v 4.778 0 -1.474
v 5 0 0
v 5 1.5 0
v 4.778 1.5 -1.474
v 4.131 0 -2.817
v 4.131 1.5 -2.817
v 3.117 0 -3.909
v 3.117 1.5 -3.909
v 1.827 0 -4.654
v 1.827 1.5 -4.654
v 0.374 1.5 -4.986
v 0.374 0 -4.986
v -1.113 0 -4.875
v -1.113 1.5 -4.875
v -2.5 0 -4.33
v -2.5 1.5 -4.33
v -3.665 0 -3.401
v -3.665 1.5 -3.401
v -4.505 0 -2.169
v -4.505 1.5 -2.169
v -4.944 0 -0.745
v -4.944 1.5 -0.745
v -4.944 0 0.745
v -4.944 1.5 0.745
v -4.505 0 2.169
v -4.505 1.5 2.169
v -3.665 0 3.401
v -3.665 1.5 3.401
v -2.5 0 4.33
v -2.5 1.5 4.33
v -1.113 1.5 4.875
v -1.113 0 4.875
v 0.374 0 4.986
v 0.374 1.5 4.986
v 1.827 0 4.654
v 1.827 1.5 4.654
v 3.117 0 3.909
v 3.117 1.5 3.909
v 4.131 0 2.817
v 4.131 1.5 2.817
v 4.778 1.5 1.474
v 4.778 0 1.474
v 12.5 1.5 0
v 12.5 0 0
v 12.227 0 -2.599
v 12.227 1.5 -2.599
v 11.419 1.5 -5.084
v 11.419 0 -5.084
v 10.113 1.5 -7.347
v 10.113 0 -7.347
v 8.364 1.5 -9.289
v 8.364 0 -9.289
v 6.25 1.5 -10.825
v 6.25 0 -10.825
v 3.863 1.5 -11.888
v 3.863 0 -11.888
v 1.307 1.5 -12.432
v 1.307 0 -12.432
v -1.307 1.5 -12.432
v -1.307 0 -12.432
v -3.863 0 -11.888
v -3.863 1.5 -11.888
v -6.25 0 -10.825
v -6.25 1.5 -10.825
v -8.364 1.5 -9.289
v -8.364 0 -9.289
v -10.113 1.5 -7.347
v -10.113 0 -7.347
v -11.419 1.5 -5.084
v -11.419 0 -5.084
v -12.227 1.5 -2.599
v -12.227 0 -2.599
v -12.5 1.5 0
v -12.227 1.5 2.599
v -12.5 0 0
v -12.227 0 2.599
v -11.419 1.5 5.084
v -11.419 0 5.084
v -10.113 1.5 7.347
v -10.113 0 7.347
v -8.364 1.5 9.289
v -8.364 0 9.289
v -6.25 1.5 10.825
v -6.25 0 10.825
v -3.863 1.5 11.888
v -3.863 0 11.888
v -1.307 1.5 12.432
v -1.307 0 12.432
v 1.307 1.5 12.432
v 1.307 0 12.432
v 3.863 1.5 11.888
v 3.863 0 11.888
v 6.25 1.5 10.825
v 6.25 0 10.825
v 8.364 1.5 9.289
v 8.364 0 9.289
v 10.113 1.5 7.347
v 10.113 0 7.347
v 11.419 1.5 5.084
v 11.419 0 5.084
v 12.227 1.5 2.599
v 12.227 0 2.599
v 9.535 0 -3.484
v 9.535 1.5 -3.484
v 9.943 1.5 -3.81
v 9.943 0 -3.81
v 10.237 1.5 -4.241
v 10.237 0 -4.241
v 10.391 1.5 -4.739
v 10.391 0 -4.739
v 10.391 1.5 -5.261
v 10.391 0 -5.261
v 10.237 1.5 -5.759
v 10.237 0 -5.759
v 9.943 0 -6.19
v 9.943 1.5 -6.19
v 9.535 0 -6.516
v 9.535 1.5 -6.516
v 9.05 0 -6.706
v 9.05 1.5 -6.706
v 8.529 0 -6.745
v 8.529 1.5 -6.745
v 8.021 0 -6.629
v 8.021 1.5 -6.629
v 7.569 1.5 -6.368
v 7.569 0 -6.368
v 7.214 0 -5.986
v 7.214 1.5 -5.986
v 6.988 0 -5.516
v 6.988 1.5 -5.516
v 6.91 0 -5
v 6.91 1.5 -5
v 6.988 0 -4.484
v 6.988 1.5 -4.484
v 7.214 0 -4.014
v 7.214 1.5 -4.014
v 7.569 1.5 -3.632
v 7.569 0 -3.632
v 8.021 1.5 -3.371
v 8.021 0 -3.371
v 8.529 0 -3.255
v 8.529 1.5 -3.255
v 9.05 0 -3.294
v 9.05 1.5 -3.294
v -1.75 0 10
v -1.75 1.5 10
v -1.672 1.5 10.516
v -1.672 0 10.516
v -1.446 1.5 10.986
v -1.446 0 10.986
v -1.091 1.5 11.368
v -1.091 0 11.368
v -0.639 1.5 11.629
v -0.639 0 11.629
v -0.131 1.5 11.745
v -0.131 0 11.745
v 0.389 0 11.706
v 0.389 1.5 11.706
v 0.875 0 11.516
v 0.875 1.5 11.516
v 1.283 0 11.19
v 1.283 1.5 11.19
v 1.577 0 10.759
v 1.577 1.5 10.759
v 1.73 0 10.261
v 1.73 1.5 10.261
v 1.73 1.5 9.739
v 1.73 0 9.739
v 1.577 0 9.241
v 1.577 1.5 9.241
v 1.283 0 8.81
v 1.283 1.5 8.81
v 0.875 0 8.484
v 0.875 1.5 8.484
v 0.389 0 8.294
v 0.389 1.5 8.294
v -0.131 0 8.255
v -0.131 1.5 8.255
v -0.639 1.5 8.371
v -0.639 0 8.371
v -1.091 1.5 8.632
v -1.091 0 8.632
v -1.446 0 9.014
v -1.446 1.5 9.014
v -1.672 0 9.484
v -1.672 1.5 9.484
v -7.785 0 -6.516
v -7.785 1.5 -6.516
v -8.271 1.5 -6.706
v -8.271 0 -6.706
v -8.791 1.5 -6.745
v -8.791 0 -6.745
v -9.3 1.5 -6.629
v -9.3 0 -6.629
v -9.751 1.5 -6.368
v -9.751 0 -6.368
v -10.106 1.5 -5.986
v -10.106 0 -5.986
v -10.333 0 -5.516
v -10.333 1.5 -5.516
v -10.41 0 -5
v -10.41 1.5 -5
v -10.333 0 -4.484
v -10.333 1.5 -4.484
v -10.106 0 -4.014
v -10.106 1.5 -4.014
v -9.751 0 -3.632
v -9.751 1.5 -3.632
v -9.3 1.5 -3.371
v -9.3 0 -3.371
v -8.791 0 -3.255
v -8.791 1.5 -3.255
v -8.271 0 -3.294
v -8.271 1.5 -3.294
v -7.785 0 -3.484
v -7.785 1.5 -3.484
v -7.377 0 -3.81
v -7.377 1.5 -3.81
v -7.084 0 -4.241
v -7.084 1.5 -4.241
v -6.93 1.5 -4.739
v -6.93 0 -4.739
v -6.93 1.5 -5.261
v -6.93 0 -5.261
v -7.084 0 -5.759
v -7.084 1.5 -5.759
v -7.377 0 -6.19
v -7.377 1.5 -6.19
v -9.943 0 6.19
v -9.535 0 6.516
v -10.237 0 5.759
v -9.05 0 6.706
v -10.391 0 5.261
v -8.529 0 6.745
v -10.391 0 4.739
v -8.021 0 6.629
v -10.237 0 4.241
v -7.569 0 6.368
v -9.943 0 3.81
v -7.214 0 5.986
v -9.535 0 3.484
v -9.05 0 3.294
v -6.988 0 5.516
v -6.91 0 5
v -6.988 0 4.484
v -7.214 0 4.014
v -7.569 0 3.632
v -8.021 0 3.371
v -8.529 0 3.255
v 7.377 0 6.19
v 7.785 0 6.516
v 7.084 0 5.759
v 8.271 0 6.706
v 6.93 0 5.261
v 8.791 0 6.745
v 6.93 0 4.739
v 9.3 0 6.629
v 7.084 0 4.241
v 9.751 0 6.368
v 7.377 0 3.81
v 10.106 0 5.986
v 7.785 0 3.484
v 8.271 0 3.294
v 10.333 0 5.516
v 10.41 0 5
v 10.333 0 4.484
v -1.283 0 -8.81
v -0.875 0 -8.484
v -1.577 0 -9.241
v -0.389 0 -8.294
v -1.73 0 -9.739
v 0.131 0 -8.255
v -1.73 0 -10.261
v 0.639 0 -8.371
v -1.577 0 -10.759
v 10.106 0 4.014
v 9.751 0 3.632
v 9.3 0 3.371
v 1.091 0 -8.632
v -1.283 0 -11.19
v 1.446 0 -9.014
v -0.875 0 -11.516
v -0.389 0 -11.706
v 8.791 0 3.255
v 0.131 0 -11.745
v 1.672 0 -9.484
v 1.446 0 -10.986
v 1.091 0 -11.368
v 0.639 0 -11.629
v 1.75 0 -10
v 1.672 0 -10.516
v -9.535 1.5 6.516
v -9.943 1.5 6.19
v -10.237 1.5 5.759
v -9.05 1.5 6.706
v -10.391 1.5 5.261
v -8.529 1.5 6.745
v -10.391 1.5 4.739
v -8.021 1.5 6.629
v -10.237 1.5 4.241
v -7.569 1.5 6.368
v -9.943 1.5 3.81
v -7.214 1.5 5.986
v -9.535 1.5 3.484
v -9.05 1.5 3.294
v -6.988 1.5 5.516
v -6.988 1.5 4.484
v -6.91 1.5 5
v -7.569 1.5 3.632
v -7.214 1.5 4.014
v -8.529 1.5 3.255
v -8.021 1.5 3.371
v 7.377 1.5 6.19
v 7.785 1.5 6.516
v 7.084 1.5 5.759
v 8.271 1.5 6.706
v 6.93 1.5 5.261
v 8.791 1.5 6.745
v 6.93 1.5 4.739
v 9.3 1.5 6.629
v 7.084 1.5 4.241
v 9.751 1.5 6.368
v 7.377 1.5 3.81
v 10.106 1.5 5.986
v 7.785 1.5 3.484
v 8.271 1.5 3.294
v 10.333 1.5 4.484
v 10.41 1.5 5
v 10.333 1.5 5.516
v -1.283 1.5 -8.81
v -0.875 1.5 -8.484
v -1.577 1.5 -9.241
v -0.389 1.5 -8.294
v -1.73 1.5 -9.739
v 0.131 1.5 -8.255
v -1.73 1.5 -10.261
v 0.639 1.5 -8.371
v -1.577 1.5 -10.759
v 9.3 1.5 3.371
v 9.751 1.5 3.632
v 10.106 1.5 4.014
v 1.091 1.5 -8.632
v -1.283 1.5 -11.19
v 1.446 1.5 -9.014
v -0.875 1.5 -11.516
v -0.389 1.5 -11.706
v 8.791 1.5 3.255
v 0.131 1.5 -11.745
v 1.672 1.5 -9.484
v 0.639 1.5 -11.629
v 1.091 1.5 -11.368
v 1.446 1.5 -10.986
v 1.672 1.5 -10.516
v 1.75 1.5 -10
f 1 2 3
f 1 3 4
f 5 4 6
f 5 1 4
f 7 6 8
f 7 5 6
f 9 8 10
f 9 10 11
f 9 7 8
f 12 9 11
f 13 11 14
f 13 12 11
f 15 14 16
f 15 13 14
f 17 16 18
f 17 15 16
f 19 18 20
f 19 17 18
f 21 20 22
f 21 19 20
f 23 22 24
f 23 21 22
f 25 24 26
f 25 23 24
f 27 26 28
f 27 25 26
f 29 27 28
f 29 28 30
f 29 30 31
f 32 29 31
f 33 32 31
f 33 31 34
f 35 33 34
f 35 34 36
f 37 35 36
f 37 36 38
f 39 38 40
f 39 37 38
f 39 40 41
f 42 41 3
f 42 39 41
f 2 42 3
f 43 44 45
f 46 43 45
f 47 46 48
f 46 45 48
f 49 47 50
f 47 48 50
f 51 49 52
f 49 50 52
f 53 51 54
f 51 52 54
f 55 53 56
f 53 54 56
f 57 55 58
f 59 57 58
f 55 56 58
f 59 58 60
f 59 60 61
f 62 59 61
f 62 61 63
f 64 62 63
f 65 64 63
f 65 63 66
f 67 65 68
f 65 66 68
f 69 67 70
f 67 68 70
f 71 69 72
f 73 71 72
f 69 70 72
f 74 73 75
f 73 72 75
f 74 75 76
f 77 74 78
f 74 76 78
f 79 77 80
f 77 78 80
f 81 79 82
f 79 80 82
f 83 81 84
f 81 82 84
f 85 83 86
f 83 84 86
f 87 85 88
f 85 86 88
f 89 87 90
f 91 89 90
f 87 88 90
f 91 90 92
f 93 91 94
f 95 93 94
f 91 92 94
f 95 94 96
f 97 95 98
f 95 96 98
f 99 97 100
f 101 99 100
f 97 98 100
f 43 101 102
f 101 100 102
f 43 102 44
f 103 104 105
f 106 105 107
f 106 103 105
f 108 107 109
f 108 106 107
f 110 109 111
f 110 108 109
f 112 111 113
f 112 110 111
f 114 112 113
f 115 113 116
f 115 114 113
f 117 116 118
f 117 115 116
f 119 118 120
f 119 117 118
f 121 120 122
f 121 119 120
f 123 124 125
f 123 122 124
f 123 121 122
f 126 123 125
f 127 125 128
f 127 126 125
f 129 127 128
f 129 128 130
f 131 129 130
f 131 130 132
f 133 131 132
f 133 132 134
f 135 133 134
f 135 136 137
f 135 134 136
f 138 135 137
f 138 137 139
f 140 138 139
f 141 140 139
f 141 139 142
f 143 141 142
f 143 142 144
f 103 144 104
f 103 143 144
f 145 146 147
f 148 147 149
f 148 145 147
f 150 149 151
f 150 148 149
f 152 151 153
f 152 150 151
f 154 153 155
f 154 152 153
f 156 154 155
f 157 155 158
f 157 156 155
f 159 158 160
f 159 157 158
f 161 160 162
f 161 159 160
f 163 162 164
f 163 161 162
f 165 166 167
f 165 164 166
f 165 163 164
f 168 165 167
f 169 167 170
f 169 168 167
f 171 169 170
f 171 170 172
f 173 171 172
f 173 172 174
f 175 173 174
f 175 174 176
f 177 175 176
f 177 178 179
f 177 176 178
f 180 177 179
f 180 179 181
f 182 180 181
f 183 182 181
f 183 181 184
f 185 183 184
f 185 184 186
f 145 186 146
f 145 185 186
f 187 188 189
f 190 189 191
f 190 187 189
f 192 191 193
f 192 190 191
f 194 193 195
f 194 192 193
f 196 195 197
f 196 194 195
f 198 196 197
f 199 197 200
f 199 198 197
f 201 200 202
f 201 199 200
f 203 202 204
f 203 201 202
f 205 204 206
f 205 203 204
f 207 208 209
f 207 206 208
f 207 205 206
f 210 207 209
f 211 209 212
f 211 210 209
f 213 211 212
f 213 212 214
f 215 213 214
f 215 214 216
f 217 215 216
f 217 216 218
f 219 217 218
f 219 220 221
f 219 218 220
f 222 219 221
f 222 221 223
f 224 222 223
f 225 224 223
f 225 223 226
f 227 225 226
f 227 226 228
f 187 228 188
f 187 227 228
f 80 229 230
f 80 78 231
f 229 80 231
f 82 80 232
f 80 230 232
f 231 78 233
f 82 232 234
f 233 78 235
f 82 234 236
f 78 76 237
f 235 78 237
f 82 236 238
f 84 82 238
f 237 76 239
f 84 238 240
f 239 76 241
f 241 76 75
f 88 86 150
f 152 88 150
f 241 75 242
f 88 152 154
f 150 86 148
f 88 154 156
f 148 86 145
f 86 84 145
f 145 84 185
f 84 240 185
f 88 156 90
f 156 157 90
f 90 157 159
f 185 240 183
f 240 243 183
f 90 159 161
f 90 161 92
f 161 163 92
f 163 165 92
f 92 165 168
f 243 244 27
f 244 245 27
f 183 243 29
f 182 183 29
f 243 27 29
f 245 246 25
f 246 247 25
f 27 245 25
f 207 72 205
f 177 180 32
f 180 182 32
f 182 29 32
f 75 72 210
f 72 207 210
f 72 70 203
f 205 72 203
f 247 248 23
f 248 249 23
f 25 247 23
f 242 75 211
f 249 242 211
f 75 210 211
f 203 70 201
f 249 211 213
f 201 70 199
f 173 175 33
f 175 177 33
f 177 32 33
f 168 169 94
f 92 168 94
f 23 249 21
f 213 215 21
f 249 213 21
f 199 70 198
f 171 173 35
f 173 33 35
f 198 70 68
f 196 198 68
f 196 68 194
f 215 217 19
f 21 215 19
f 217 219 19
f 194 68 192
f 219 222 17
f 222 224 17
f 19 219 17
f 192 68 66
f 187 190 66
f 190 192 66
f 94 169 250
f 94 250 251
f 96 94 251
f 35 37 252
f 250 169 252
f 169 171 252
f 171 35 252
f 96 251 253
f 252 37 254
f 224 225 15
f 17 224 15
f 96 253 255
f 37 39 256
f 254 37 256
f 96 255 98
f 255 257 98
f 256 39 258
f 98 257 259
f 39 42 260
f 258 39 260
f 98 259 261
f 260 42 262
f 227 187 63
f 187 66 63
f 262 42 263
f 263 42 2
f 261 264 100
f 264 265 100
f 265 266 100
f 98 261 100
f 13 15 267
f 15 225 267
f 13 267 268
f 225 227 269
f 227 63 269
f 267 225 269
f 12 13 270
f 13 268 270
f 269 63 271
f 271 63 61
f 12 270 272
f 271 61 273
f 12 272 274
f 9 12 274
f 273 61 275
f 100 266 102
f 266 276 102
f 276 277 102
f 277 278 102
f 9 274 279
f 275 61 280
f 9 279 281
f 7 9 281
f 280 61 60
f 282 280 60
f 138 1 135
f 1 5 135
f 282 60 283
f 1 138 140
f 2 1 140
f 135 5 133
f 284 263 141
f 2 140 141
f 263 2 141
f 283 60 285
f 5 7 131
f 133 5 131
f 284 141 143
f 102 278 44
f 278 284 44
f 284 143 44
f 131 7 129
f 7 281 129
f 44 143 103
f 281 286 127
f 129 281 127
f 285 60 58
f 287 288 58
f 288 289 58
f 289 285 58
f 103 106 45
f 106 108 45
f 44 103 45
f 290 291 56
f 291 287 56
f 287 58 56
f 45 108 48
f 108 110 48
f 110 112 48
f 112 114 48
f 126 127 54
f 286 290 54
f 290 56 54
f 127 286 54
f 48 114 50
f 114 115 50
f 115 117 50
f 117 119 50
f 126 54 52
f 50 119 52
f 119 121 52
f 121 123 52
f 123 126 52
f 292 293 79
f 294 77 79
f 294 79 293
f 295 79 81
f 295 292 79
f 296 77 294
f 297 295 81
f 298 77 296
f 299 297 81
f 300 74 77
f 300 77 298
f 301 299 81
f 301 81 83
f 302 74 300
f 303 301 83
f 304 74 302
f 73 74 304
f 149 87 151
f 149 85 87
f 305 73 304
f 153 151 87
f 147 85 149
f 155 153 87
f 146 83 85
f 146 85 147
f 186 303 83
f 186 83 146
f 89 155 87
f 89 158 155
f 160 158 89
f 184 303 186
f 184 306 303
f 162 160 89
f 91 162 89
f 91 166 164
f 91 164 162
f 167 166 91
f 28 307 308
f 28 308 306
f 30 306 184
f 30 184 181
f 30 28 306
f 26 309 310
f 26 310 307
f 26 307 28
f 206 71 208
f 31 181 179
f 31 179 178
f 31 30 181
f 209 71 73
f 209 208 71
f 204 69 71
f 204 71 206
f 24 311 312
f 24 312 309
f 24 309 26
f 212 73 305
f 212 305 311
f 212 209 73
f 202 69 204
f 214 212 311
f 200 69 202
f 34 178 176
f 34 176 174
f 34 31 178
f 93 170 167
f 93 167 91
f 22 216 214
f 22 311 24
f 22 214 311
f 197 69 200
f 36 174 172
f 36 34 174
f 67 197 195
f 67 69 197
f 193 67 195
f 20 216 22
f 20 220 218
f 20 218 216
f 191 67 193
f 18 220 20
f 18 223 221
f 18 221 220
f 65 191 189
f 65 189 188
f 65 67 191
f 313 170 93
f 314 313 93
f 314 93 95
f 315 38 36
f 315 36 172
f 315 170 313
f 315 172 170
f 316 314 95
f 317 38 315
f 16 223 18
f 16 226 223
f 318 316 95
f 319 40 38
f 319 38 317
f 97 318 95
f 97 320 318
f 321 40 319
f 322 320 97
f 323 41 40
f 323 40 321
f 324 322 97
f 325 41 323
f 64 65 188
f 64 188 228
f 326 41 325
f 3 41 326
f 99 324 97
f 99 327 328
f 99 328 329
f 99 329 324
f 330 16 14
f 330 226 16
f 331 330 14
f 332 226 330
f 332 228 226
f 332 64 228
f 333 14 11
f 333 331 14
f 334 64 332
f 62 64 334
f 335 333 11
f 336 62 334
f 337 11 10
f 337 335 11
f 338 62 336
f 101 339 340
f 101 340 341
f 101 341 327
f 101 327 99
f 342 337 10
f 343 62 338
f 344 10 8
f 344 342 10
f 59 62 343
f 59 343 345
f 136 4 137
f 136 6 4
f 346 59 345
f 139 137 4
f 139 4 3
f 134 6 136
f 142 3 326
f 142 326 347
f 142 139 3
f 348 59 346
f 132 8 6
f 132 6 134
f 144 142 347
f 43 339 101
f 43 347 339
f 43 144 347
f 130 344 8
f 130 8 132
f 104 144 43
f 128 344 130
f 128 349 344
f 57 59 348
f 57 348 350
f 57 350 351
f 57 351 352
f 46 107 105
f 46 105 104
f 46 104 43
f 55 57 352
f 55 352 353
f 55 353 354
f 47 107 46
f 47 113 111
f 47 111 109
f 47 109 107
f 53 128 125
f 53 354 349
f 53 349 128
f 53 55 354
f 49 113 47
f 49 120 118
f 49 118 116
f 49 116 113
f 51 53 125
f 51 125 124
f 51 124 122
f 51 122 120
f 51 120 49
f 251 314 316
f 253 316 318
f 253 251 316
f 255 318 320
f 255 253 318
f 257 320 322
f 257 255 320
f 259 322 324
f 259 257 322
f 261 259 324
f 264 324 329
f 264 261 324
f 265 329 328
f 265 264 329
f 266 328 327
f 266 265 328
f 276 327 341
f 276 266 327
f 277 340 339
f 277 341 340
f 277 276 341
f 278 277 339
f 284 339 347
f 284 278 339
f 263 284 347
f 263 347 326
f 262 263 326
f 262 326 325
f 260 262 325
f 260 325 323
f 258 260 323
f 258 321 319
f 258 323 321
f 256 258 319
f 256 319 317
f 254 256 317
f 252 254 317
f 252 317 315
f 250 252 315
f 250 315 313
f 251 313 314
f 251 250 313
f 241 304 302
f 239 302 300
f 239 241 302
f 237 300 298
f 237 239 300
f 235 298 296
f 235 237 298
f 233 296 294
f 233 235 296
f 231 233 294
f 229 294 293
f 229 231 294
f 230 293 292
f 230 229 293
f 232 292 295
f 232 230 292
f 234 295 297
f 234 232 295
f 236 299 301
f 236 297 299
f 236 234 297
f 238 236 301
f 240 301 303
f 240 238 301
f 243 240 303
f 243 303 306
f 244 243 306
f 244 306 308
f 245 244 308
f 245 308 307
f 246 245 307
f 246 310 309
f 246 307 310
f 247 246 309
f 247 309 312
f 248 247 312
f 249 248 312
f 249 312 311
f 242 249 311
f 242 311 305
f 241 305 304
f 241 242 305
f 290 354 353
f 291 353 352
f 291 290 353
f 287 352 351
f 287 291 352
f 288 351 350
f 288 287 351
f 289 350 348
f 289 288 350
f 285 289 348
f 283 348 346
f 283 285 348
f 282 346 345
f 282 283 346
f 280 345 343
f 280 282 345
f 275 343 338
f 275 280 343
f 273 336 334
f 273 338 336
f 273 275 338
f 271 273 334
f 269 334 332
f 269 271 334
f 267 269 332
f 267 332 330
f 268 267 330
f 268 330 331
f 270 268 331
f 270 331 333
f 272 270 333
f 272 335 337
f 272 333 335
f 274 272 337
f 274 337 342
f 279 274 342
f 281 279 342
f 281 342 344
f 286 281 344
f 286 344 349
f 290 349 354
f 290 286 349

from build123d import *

# Parameters (mm, degrees)
SKETCH1_R           = 12.5
SKETCH1_R_2         = 5
BOSS_EXTRUDE1_DEPTH = 1.5
SKETCH2_R           = 1.75
CUT_EXTRUDE1_DEPTH  = 2.5
CIRPATTERN1_COUNT   = 6


with BuildPart() as part:
    # Sketch1 → Boss-Extrude1 (new body)
    with BuildSketch(Plane(origin=(0, 0, 0), x_dir=(1, 0, 0), z_dir=(0, 1, 0))):
        Circle(SKETCH1_R)
        Circle(SKETCH1_R_2, mode=Mode.SUBTRACT)
    extrude(amount=BOSS_EXTRUDE1_DEPTH)

    # Sketch2 → Cut-Extrude1 (cut, through all)
    with BuildSketch(Plane(origin=(0, 0, 0), x_dir=(1, 0, 0), z_dir=(0, 1, 0))):
        with Locations((0, 10)):
            Circle(SKETCH2_R)
    cut_extrude1 = extrude(amount=CUT_EXTRUDE1_DEPTH, mode=Mode.SUBTRACT)

    # CirPattern1: Cut-Extrude1 ×6 about axis
    cirpattern1_axis = Axis((0, 0, 0), (0, 1, 0))
    for i in range(1, CIRPATTERN1_COUNT):
        add(cut_extrude1.rotate(cirpattern1_axis, i * 360 / CIRPATTERN1_COUNT), mode=Mode.SUBTRACT)


solid = part.part
